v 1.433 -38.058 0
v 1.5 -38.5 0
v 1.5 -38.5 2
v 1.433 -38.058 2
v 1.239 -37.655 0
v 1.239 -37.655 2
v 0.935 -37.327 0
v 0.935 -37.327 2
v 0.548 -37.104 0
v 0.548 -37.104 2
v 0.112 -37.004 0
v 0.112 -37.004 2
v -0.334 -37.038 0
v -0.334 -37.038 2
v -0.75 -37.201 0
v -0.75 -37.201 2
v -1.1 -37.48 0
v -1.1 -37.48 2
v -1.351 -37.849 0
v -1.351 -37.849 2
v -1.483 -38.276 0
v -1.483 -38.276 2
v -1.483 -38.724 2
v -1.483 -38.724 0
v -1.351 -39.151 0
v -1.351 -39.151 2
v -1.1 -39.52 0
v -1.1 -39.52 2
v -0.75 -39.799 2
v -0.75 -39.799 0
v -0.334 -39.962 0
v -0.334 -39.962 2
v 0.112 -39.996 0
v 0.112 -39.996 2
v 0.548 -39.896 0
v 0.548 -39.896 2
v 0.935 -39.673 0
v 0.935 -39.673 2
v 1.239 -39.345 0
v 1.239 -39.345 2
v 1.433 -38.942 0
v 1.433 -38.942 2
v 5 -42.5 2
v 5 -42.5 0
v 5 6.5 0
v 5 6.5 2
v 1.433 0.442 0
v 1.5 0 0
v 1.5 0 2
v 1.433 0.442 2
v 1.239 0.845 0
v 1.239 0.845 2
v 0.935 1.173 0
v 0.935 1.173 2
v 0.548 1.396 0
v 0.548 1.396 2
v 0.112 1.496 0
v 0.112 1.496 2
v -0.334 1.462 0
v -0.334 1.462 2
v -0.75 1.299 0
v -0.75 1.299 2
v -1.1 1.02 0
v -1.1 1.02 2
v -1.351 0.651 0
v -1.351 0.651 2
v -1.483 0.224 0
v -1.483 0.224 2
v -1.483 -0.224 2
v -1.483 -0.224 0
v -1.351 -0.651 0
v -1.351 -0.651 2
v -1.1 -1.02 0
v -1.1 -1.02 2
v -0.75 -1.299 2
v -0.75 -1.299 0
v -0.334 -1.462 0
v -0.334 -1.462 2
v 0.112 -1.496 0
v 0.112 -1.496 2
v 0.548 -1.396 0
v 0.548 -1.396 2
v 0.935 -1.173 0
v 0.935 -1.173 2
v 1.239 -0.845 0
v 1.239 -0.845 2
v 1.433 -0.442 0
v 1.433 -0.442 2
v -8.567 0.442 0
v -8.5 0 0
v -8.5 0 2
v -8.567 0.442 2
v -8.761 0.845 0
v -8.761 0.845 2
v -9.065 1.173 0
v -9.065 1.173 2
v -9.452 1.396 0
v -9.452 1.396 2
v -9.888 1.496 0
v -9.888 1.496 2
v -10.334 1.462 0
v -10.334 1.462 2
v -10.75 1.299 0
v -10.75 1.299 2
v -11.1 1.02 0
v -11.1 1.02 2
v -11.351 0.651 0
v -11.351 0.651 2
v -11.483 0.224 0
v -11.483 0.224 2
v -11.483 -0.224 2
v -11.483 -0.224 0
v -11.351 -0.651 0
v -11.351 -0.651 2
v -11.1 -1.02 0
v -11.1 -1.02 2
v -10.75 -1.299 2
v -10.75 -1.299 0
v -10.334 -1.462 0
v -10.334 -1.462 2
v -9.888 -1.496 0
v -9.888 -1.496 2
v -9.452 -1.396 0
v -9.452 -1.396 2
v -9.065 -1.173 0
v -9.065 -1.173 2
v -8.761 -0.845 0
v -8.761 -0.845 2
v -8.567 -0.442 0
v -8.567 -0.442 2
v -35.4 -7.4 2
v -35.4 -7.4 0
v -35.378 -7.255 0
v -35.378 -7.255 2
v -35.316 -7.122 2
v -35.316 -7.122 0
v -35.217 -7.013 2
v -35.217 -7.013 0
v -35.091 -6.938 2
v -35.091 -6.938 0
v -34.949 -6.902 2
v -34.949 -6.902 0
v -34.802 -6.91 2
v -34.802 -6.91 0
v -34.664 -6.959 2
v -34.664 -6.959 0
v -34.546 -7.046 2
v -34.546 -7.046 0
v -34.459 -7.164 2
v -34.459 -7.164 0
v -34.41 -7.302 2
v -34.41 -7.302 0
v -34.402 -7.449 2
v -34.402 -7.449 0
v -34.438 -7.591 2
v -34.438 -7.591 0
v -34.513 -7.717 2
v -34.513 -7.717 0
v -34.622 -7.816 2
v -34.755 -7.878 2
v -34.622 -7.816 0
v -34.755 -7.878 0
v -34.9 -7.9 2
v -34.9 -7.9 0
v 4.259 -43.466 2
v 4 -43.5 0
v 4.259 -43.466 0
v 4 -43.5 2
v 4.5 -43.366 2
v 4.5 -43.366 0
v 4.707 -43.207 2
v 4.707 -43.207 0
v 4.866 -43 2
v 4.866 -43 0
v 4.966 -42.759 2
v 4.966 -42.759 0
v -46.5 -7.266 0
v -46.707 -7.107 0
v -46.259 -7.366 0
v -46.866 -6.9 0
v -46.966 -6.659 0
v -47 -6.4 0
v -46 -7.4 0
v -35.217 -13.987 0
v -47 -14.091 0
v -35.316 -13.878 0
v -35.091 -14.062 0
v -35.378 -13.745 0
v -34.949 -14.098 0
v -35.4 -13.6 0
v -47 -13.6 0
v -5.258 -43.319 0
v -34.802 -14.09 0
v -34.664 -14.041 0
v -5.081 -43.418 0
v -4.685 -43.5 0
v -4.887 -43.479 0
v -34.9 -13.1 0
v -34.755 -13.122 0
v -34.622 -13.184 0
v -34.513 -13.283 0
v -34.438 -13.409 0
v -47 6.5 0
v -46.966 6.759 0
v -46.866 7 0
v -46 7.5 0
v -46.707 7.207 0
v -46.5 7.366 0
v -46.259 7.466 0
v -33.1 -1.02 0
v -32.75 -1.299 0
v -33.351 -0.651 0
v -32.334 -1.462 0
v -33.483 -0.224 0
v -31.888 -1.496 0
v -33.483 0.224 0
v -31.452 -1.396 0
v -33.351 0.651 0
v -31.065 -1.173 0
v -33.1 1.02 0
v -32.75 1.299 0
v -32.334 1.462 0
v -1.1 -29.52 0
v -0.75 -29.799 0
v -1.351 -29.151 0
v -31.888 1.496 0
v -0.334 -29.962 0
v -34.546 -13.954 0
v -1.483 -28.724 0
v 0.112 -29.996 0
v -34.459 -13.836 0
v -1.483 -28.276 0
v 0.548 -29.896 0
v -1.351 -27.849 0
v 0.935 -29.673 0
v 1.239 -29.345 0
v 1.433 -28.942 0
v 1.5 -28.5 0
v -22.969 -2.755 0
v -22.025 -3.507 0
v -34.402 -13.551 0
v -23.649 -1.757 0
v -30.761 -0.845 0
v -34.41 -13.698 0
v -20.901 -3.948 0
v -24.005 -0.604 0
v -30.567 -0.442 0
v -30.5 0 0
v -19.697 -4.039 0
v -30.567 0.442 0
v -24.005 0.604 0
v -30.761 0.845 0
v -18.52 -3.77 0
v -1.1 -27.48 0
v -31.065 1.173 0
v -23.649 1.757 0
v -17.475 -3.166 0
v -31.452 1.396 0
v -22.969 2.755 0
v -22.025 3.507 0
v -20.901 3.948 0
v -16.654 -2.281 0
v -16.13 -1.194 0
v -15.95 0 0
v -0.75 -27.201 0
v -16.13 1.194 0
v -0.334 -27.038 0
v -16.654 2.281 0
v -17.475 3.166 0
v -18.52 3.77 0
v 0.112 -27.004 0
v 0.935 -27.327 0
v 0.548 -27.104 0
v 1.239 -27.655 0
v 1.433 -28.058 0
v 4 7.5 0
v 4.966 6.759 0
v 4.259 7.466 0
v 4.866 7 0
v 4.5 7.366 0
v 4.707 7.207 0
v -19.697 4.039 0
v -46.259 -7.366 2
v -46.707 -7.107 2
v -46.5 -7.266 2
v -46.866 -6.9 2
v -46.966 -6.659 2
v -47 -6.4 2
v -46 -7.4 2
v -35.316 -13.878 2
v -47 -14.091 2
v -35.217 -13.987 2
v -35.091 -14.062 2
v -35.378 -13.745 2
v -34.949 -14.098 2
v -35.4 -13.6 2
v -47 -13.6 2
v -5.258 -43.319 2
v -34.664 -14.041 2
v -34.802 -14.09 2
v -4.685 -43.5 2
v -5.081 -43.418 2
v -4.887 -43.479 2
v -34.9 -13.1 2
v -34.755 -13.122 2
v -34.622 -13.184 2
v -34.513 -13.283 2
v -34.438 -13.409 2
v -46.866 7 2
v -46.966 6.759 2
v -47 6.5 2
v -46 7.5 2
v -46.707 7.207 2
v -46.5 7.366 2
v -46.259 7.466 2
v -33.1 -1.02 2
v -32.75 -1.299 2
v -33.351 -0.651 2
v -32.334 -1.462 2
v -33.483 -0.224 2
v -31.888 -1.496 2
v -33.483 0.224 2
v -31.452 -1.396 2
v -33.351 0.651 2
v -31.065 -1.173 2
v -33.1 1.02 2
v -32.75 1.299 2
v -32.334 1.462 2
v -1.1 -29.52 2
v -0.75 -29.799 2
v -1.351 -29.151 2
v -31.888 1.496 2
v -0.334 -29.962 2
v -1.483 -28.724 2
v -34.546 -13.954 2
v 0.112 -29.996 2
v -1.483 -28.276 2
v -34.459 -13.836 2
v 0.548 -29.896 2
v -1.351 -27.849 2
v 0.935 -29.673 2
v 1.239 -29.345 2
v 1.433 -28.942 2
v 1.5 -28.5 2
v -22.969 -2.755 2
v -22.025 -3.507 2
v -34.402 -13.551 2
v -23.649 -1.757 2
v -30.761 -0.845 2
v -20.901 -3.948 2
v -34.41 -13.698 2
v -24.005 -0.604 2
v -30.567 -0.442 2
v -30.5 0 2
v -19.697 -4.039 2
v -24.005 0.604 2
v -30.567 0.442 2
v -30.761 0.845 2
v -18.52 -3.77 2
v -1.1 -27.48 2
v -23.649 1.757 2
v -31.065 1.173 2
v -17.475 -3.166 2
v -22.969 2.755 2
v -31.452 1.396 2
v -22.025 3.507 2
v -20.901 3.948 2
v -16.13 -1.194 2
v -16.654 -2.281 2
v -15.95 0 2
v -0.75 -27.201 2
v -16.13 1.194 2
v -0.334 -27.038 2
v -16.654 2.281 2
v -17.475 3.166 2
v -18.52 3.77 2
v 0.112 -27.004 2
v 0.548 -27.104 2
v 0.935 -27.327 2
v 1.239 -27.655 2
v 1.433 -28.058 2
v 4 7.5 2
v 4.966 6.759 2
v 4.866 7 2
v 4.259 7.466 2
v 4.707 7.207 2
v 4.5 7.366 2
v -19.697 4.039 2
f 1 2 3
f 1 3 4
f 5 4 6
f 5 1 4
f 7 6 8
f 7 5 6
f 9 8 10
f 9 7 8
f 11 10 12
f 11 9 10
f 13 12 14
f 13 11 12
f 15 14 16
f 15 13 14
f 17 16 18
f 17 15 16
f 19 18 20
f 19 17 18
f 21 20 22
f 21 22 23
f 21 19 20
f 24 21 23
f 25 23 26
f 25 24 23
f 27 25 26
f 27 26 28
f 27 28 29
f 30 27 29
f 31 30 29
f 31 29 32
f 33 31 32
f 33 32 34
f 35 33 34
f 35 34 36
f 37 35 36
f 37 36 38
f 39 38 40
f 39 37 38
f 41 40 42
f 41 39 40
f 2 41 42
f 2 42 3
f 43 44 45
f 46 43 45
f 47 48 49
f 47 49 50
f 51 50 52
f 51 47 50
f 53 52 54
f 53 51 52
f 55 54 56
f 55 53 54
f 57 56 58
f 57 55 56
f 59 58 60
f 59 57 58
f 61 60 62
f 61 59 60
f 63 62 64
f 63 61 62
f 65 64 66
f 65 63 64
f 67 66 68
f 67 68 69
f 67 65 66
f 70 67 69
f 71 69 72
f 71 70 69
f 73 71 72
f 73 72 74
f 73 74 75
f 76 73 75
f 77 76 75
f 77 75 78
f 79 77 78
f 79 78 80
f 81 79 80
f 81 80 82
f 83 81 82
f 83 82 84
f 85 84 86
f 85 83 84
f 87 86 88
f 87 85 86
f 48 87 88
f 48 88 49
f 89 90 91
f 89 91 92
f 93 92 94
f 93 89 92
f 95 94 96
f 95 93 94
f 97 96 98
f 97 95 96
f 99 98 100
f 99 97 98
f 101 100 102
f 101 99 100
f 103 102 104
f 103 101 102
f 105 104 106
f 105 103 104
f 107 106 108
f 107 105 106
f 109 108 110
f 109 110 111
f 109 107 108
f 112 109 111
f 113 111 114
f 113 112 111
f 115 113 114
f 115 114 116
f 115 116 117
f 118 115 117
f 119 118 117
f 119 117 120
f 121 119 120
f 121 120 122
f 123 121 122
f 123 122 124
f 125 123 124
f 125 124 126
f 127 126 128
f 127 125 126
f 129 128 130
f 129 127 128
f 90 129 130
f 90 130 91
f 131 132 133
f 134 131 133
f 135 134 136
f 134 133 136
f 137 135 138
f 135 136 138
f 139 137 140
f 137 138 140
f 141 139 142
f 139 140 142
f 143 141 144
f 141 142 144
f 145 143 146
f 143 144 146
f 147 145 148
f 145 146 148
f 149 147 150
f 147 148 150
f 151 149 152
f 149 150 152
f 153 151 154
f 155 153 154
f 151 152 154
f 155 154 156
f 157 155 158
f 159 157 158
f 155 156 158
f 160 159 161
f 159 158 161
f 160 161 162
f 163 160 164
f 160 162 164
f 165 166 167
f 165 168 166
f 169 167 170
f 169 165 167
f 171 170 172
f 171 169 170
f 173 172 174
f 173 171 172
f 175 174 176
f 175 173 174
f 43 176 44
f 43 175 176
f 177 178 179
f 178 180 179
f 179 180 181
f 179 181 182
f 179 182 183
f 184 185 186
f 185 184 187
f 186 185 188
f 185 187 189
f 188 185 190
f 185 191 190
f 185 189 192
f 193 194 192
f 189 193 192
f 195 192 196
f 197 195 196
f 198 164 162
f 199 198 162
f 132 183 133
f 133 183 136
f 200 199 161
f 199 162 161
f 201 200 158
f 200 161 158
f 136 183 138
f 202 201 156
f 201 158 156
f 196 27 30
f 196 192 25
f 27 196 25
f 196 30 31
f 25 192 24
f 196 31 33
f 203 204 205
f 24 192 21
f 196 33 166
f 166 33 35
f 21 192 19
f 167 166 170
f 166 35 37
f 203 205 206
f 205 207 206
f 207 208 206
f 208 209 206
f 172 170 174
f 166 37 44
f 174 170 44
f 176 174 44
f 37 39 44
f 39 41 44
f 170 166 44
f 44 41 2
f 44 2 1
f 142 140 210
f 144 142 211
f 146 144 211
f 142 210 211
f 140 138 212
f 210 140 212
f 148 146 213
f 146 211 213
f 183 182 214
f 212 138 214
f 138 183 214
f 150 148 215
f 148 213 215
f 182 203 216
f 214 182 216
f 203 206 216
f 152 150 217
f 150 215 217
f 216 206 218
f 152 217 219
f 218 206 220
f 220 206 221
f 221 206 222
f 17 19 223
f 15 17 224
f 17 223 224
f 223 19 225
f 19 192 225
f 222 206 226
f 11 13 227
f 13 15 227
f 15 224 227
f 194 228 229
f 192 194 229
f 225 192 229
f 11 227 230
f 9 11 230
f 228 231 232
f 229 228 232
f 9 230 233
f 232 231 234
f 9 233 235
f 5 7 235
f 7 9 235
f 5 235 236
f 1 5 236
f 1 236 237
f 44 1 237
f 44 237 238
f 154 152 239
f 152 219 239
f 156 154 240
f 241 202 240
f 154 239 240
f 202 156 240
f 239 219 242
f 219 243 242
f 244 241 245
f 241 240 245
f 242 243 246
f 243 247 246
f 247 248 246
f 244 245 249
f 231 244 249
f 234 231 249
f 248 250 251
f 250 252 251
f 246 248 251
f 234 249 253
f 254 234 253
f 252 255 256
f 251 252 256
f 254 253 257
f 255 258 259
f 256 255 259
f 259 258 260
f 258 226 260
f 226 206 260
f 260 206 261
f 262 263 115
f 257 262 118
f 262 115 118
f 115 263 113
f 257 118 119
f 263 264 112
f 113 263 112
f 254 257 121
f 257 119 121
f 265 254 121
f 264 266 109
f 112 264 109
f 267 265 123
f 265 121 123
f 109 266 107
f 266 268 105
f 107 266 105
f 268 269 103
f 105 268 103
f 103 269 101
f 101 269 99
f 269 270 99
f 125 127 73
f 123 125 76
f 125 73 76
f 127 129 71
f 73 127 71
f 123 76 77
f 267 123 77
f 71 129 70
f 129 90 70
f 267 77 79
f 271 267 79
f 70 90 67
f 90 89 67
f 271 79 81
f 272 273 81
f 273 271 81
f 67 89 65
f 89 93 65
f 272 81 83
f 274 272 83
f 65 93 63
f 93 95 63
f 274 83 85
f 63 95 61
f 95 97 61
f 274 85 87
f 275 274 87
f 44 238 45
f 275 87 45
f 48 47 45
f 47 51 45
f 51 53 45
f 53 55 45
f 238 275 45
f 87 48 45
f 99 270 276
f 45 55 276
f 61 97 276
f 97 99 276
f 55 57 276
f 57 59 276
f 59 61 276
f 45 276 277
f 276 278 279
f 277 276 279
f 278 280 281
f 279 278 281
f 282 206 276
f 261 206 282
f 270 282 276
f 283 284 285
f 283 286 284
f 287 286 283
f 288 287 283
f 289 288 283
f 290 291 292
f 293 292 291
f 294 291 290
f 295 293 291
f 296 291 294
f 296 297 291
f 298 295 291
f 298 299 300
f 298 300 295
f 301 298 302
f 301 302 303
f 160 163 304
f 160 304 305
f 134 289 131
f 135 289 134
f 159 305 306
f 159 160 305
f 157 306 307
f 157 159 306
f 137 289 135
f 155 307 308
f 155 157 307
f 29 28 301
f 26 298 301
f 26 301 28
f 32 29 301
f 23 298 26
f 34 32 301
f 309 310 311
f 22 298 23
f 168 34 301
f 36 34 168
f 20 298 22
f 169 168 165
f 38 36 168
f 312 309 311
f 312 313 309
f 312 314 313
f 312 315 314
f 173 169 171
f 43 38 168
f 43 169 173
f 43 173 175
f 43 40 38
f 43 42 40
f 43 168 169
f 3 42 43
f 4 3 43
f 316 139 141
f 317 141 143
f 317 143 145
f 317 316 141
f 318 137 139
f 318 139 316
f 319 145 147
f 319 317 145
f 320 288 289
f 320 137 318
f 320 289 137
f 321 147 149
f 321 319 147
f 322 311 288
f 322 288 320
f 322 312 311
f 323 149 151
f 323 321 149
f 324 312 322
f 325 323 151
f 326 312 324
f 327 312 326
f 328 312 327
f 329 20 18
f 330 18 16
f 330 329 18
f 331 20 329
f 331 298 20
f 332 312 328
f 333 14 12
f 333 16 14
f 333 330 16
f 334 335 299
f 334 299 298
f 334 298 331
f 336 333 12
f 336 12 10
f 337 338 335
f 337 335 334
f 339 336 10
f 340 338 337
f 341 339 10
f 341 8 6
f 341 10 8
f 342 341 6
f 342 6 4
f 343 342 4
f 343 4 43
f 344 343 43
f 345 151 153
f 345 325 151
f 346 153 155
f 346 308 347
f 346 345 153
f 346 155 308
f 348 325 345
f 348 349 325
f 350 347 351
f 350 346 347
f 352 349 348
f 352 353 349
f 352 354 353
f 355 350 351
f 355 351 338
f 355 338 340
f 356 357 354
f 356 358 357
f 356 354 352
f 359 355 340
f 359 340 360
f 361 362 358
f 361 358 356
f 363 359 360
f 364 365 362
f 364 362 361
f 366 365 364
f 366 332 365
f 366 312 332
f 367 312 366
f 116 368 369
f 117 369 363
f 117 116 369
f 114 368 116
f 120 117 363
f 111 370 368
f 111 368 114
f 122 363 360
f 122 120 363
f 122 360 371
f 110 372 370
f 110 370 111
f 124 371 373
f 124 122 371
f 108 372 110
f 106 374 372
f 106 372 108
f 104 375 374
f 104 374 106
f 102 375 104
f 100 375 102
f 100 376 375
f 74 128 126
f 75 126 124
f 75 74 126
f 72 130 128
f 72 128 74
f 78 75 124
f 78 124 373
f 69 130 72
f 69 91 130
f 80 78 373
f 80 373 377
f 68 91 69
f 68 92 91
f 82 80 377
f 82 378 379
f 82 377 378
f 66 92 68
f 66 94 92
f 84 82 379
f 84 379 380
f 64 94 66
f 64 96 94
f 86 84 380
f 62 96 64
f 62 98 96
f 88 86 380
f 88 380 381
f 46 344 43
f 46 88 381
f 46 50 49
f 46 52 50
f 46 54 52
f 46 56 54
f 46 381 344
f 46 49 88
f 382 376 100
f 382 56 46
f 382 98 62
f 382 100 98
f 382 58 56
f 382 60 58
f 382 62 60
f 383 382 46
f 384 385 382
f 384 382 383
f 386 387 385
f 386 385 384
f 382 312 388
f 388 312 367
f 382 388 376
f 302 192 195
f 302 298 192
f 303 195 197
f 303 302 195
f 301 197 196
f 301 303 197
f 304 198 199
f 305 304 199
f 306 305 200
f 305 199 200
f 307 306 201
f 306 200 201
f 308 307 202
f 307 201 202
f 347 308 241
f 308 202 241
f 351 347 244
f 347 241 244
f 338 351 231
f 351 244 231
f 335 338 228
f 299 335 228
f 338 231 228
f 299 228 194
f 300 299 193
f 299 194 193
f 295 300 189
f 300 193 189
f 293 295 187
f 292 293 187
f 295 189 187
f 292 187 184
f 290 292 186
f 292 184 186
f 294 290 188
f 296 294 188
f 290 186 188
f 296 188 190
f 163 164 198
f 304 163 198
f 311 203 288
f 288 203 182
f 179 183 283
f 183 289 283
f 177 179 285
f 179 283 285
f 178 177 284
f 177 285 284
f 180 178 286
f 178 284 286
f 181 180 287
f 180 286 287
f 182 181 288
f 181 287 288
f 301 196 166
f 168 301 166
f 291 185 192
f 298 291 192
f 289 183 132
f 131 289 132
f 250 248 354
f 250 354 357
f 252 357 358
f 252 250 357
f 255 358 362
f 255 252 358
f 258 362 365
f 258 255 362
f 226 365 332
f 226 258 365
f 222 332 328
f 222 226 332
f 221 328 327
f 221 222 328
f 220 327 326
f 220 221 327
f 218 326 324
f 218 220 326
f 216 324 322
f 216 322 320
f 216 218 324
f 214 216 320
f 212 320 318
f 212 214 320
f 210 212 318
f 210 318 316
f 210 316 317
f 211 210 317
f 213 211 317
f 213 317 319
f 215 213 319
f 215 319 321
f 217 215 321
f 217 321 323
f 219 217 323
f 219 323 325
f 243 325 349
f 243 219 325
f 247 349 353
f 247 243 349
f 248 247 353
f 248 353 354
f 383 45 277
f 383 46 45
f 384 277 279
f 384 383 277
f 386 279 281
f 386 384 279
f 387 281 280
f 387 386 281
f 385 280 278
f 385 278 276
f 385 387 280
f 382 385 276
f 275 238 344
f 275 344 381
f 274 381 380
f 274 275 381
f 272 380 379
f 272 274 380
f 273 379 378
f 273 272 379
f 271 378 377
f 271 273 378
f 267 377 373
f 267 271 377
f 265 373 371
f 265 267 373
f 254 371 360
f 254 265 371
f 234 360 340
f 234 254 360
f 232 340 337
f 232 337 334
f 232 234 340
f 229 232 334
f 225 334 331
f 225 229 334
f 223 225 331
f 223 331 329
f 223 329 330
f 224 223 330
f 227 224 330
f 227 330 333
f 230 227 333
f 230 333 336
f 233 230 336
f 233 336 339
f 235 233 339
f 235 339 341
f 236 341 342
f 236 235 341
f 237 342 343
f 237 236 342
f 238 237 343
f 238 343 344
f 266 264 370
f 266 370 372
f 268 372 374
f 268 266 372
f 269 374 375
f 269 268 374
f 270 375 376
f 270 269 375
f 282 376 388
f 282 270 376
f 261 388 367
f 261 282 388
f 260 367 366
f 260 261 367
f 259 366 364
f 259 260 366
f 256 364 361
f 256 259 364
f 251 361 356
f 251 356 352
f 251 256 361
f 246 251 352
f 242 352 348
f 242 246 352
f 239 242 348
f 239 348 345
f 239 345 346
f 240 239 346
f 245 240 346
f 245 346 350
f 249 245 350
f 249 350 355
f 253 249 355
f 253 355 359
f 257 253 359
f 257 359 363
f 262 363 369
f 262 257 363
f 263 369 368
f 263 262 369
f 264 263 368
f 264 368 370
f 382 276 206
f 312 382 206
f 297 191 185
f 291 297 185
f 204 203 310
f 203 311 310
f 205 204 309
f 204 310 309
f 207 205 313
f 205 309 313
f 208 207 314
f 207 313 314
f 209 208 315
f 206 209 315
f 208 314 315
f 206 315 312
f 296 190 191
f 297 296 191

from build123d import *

# Parameters (mm, degrees)
SKETCH_1_R          = 1.5
SKETCH_1_R_2        = 4.05
EXTRUDE_1_DEPTH     = 2
SKETCH_2_R          = 0.5
CUT_EXTRUDE_1_DEPTH = 10
FILLET_1_R          = 1


with BuildPart() as part:
    # 草图1 → 凸台-拉伸1 (new body)
    with BuildSketch(Plane.XY):
        Polygon((-47, -14.091283395), (-5, -43.5), (5, -43.5), (5, 7.5), (-47, 7.5), (-47, -7.4), (-34.9, -7.4), (-34.9, -13.6), (-47, -13.6), align=None)
        with Locations((0, -38.5)):
            Circle(SKETCH_1_R, mode=Mode.SUBTRACT)
        with Locations((0, -28.5)):
            Circle(SKETCH_1_R, mode=Mode.SUBTRACT)
        with Locations((-32, 0)):
            Circle(SKETCH_1_R, mode=Mode.SUBTRACT)
        with Locations((-20, 0)):
            Circle(SKETCH_1_R_2, mode=Mode.SUBTRACT)
        with Locations((-10, 0)):
            Circle(SKETCH_1_R, mode=Mode.SUBTRACT)
        Circle(SKETCH_1_R, mode=Mode.SUBTRACT)
    extrude(amount=EXTRUDE_1_DEPTH)

    # 草图2 → 切除-拉伸1 (cut)
    with BuildSketch(Plane(origin=(0, 0, 0), x_dir=(-1, 0, 0), z_dir=(0, 0, -1))):
        with Locations((34.9, -7.4)):
            Circle(SKETCH_2_R)
        with Locations((34.9, -13.6)):
            Circle(SKETCH_2_R)
    extrude(amount=-CUT_EXTRUDE_1_DEPTH, mode=Mode.SUBTRACT)

    # 圆角1
    fillet_1_edges = [part.edges().sort_by_distance(p)[0] for p in [
        (-47, -7.4, 1),
        (-47, 7.5, 1),
        (5, 7.5, 1),
        (5, -43.5, 1),
        (-5, -43.5, 1),
    ]]
    fillet(fillet_1_edges, radius=FILLET_1_R)


solid = part.part
